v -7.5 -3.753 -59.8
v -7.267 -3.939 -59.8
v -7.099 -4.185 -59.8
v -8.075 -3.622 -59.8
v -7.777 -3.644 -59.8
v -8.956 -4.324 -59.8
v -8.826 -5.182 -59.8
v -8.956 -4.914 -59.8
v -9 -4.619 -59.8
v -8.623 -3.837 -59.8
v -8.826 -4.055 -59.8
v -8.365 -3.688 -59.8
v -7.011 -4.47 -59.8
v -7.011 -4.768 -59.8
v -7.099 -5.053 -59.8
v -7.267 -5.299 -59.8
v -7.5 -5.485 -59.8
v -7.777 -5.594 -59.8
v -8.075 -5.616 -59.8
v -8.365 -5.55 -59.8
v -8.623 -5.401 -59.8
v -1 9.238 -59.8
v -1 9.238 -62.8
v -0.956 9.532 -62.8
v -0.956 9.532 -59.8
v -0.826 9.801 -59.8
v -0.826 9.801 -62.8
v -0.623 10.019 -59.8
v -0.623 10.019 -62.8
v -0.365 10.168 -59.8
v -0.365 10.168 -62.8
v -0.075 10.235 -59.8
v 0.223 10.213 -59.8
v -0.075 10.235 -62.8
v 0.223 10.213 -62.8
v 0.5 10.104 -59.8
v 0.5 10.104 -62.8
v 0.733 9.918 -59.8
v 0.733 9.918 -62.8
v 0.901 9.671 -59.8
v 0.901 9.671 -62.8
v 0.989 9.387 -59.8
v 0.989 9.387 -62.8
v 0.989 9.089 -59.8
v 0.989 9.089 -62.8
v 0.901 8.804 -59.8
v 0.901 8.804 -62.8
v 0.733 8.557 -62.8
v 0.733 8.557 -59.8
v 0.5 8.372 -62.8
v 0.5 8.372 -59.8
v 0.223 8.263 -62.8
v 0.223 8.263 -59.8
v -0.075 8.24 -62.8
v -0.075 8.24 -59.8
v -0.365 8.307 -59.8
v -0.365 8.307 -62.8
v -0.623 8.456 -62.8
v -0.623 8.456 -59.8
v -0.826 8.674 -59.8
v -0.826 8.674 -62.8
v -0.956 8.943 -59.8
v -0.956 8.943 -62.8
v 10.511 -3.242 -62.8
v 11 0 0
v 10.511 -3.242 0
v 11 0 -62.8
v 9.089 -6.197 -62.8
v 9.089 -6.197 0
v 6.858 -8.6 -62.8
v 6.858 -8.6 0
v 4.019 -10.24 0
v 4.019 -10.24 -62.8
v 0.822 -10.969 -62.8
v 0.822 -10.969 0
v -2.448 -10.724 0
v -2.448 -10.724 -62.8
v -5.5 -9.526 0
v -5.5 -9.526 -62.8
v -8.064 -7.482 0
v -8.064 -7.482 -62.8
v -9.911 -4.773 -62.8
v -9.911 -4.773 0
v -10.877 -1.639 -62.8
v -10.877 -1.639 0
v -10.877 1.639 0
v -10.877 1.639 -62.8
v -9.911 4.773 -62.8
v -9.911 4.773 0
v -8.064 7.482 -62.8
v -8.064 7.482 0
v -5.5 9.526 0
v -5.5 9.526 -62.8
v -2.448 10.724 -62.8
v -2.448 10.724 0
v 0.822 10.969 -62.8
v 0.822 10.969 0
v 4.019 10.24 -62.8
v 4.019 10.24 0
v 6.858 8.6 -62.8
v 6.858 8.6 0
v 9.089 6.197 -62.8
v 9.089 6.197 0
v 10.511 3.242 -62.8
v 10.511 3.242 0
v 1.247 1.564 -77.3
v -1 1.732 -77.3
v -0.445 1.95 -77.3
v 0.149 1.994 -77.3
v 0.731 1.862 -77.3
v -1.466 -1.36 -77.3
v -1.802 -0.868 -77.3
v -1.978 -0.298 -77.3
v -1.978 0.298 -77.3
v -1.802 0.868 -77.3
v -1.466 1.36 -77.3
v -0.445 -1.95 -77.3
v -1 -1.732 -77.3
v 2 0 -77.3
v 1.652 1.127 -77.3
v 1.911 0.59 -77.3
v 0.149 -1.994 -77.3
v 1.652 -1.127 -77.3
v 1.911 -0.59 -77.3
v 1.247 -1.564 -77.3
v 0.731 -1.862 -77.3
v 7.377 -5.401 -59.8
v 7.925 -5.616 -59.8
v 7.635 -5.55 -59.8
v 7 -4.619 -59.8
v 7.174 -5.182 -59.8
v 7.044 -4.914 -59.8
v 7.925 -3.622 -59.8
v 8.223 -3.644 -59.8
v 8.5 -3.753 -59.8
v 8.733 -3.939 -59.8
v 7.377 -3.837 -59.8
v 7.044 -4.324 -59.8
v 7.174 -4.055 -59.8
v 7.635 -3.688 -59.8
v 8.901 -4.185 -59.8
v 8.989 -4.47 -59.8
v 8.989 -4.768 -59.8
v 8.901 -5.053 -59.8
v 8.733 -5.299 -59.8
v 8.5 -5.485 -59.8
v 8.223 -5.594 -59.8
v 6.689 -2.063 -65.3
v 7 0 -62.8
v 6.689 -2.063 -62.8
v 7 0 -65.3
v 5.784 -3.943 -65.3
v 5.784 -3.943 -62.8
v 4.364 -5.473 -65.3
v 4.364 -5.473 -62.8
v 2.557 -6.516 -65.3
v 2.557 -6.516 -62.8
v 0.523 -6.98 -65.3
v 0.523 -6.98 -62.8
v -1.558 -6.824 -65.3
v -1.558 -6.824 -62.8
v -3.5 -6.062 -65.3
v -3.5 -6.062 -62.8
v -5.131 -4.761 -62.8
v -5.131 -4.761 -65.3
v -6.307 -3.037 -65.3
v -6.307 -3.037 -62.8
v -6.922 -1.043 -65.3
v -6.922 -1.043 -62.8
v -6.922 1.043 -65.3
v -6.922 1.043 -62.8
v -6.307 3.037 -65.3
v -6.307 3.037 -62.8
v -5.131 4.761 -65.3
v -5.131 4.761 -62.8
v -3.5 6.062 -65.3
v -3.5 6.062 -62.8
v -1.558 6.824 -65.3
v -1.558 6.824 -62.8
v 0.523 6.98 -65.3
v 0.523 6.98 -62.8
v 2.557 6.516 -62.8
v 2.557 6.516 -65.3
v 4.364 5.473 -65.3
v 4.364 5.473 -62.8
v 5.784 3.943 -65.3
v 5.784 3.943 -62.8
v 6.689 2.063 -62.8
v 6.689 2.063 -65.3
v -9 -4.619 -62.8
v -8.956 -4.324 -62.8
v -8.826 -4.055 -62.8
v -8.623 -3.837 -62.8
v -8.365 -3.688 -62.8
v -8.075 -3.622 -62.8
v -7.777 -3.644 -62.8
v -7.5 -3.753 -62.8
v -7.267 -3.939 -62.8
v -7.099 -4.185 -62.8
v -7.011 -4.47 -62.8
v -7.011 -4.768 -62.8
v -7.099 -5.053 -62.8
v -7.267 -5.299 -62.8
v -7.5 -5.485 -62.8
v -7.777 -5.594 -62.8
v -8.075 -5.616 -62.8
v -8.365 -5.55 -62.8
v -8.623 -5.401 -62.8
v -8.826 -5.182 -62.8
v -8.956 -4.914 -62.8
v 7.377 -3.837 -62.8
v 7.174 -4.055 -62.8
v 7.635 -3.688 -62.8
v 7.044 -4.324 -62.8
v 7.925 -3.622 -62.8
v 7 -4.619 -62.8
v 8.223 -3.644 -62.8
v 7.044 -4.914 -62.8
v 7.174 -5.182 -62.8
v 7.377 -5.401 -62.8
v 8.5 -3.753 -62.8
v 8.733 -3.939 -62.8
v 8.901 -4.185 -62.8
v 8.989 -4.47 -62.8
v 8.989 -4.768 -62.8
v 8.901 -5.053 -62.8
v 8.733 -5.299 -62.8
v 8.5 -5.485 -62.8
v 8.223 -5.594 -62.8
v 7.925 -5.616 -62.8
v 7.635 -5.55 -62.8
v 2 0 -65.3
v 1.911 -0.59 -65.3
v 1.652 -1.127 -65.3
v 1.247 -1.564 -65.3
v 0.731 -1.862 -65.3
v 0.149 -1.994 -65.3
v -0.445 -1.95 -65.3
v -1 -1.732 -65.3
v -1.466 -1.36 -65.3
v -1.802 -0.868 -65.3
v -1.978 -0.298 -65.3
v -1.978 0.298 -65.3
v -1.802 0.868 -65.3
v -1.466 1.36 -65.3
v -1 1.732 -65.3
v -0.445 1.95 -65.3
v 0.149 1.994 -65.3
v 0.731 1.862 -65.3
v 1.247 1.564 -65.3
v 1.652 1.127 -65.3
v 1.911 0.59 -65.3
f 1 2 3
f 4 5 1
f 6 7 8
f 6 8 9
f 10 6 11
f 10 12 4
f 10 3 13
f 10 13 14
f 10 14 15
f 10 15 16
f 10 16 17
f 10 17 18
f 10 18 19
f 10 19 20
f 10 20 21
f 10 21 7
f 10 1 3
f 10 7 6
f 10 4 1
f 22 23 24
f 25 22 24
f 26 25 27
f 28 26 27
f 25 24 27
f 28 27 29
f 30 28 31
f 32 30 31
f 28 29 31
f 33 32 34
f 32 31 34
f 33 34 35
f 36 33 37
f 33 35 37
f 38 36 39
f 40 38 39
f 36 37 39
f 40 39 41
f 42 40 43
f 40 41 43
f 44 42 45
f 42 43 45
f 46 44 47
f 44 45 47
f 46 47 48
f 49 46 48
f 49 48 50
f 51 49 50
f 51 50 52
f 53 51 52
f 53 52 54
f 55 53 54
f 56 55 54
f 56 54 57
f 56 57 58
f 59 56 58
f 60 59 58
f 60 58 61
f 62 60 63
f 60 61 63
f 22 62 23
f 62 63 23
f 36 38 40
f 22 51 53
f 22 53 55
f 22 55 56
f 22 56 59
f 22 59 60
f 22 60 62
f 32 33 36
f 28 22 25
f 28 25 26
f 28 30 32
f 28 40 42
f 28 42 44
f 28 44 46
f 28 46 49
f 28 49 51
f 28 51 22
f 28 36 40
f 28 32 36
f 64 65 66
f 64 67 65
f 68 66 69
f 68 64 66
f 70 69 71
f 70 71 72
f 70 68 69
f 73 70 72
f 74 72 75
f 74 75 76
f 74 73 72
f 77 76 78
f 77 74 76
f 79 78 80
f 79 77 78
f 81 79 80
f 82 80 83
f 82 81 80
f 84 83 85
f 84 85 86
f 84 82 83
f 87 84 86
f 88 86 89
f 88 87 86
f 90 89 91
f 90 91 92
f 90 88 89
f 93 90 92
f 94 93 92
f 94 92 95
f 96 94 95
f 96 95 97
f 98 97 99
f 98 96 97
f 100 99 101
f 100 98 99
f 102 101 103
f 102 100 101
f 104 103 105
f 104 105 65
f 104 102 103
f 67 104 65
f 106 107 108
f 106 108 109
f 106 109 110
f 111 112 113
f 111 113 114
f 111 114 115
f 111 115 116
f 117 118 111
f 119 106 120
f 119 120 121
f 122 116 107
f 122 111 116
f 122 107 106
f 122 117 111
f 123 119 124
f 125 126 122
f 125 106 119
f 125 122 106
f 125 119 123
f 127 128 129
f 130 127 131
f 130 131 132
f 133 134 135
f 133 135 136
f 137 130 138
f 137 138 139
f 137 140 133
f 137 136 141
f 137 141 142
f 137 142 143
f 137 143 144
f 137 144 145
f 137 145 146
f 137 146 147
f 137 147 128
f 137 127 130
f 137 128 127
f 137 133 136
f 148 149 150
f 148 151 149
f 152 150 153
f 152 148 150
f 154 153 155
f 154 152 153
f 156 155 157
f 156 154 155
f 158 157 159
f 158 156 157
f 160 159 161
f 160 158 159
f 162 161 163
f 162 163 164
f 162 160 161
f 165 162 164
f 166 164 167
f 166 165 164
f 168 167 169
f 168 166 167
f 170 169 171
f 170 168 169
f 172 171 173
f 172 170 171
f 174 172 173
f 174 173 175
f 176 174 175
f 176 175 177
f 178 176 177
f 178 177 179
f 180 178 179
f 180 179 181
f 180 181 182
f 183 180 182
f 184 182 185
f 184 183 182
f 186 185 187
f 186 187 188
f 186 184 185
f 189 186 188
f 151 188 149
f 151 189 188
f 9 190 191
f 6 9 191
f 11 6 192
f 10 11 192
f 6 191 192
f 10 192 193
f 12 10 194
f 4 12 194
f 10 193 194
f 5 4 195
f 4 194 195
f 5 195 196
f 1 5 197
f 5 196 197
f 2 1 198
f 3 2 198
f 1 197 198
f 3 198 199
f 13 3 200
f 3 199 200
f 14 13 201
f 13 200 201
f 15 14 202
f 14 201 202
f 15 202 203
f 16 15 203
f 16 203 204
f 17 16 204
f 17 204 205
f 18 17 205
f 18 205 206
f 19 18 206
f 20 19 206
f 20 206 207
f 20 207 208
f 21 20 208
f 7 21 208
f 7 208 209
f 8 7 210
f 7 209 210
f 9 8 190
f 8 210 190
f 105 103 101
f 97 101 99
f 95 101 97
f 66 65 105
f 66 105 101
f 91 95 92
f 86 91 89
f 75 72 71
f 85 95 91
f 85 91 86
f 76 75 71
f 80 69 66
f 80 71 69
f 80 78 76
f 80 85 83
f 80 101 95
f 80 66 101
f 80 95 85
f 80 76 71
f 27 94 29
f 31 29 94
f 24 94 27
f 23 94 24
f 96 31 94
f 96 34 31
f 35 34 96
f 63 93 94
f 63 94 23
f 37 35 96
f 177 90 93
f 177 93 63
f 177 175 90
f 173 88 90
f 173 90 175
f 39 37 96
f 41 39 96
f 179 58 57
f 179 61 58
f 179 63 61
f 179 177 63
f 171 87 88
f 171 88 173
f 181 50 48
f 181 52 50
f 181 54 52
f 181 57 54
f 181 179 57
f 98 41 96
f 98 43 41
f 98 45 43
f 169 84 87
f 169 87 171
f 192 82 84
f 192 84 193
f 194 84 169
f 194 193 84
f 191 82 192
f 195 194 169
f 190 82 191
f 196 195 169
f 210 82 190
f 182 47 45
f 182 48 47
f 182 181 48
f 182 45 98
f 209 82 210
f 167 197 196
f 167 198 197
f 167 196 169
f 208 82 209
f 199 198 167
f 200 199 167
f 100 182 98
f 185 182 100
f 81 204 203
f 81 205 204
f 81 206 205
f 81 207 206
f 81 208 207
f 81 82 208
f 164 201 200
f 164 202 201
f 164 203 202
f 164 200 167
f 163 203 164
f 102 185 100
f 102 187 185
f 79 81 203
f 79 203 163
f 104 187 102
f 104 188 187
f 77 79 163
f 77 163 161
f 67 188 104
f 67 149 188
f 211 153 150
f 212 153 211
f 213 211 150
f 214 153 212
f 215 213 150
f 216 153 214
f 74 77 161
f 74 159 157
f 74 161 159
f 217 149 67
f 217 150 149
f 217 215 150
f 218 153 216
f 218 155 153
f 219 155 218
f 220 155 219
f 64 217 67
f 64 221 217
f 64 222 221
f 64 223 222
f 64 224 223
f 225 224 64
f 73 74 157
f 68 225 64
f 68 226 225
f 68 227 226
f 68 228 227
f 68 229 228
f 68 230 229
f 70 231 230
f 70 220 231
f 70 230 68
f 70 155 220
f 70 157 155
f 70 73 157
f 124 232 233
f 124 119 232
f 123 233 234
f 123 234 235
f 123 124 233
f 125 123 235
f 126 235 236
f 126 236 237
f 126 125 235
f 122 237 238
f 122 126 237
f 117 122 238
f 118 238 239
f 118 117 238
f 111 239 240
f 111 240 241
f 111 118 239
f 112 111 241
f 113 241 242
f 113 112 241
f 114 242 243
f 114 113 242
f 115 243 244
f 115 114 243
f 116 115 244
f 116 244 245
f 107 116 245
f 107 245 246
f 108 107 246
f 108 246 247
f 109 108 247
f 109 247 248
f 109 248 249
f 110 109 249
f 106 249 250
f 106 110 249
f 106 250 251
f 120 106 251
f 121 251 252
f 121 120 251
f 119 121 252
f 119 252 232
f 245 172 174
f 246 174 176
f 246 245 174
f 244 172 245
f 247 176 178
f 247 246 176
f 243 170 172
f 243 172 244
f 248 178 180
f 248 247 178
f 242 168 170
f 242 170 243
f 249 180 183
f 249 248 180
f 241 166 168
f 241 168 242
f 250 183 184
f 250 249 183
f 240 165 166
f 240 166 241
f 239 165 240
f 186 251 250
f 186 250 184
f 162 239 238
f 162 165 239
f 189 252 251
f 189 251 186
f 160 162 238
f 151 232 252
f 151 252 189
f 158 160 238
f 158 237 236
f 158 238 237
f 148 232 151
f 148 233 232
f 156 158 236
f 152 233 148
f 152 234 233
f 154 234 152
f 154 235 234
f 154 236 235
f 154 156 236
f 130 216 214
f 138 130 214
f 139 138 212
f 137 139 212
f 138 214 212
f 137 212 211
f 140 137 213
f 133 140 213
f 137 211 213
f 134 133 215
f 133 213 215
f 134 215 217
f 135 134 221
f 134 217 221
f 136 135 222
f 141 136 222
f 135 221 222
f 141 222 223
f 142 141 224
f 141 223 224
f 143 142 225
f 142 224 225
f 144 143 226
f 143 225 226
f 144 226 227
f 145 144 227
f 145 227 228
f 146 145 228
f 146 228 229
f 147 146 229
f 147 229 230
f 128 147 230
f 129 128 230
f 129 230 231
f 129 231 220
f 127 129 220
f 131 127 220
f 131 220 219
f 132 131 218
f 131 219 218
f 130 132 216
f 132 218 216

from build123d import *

# Parameters (mm, degrees)
SKETCH2_R          = 1
CUT_EXTRUDE1_DEPTH = 3


with BuildPart() as part:
    # Sketch1 → Revolve1 (revolve)
    with BuildSketch(Plane(origin=(0, 0, 0), x_dir=(1, 0, 0), z_dir=(0, 1, 0))):
        Polygon((0, 0), (11, 0), (11, 62.8), (7, 62.8), (7, 65.3), (2, 65.3), (2, 77.3), (0, 77.3), align=None)
    revolve(axis=Axis((0, 0, 0), (0, 0, -1)))

    # Sketch2 → Cut-Extrude1 (cut)
    with BuildSketch(Plane(origin=(0, 0, -62.8), x_dir=(-1, 0, 0), z_dir=(0, 0, -1))):
        with Locations((-8, -4.618802154)):
            Circle(SKETCH2_R)
        with Locations((0, 9.237604307)):
            Circle(SKETCH2_R)
        with Locations((8, -4.618802154)):
            Circle(SKETCH2_R)
    extrude(amount=-CUT_EXTRUDE1_DEPTH, mode=Mode.SUBTRACT)


solid = part.part
